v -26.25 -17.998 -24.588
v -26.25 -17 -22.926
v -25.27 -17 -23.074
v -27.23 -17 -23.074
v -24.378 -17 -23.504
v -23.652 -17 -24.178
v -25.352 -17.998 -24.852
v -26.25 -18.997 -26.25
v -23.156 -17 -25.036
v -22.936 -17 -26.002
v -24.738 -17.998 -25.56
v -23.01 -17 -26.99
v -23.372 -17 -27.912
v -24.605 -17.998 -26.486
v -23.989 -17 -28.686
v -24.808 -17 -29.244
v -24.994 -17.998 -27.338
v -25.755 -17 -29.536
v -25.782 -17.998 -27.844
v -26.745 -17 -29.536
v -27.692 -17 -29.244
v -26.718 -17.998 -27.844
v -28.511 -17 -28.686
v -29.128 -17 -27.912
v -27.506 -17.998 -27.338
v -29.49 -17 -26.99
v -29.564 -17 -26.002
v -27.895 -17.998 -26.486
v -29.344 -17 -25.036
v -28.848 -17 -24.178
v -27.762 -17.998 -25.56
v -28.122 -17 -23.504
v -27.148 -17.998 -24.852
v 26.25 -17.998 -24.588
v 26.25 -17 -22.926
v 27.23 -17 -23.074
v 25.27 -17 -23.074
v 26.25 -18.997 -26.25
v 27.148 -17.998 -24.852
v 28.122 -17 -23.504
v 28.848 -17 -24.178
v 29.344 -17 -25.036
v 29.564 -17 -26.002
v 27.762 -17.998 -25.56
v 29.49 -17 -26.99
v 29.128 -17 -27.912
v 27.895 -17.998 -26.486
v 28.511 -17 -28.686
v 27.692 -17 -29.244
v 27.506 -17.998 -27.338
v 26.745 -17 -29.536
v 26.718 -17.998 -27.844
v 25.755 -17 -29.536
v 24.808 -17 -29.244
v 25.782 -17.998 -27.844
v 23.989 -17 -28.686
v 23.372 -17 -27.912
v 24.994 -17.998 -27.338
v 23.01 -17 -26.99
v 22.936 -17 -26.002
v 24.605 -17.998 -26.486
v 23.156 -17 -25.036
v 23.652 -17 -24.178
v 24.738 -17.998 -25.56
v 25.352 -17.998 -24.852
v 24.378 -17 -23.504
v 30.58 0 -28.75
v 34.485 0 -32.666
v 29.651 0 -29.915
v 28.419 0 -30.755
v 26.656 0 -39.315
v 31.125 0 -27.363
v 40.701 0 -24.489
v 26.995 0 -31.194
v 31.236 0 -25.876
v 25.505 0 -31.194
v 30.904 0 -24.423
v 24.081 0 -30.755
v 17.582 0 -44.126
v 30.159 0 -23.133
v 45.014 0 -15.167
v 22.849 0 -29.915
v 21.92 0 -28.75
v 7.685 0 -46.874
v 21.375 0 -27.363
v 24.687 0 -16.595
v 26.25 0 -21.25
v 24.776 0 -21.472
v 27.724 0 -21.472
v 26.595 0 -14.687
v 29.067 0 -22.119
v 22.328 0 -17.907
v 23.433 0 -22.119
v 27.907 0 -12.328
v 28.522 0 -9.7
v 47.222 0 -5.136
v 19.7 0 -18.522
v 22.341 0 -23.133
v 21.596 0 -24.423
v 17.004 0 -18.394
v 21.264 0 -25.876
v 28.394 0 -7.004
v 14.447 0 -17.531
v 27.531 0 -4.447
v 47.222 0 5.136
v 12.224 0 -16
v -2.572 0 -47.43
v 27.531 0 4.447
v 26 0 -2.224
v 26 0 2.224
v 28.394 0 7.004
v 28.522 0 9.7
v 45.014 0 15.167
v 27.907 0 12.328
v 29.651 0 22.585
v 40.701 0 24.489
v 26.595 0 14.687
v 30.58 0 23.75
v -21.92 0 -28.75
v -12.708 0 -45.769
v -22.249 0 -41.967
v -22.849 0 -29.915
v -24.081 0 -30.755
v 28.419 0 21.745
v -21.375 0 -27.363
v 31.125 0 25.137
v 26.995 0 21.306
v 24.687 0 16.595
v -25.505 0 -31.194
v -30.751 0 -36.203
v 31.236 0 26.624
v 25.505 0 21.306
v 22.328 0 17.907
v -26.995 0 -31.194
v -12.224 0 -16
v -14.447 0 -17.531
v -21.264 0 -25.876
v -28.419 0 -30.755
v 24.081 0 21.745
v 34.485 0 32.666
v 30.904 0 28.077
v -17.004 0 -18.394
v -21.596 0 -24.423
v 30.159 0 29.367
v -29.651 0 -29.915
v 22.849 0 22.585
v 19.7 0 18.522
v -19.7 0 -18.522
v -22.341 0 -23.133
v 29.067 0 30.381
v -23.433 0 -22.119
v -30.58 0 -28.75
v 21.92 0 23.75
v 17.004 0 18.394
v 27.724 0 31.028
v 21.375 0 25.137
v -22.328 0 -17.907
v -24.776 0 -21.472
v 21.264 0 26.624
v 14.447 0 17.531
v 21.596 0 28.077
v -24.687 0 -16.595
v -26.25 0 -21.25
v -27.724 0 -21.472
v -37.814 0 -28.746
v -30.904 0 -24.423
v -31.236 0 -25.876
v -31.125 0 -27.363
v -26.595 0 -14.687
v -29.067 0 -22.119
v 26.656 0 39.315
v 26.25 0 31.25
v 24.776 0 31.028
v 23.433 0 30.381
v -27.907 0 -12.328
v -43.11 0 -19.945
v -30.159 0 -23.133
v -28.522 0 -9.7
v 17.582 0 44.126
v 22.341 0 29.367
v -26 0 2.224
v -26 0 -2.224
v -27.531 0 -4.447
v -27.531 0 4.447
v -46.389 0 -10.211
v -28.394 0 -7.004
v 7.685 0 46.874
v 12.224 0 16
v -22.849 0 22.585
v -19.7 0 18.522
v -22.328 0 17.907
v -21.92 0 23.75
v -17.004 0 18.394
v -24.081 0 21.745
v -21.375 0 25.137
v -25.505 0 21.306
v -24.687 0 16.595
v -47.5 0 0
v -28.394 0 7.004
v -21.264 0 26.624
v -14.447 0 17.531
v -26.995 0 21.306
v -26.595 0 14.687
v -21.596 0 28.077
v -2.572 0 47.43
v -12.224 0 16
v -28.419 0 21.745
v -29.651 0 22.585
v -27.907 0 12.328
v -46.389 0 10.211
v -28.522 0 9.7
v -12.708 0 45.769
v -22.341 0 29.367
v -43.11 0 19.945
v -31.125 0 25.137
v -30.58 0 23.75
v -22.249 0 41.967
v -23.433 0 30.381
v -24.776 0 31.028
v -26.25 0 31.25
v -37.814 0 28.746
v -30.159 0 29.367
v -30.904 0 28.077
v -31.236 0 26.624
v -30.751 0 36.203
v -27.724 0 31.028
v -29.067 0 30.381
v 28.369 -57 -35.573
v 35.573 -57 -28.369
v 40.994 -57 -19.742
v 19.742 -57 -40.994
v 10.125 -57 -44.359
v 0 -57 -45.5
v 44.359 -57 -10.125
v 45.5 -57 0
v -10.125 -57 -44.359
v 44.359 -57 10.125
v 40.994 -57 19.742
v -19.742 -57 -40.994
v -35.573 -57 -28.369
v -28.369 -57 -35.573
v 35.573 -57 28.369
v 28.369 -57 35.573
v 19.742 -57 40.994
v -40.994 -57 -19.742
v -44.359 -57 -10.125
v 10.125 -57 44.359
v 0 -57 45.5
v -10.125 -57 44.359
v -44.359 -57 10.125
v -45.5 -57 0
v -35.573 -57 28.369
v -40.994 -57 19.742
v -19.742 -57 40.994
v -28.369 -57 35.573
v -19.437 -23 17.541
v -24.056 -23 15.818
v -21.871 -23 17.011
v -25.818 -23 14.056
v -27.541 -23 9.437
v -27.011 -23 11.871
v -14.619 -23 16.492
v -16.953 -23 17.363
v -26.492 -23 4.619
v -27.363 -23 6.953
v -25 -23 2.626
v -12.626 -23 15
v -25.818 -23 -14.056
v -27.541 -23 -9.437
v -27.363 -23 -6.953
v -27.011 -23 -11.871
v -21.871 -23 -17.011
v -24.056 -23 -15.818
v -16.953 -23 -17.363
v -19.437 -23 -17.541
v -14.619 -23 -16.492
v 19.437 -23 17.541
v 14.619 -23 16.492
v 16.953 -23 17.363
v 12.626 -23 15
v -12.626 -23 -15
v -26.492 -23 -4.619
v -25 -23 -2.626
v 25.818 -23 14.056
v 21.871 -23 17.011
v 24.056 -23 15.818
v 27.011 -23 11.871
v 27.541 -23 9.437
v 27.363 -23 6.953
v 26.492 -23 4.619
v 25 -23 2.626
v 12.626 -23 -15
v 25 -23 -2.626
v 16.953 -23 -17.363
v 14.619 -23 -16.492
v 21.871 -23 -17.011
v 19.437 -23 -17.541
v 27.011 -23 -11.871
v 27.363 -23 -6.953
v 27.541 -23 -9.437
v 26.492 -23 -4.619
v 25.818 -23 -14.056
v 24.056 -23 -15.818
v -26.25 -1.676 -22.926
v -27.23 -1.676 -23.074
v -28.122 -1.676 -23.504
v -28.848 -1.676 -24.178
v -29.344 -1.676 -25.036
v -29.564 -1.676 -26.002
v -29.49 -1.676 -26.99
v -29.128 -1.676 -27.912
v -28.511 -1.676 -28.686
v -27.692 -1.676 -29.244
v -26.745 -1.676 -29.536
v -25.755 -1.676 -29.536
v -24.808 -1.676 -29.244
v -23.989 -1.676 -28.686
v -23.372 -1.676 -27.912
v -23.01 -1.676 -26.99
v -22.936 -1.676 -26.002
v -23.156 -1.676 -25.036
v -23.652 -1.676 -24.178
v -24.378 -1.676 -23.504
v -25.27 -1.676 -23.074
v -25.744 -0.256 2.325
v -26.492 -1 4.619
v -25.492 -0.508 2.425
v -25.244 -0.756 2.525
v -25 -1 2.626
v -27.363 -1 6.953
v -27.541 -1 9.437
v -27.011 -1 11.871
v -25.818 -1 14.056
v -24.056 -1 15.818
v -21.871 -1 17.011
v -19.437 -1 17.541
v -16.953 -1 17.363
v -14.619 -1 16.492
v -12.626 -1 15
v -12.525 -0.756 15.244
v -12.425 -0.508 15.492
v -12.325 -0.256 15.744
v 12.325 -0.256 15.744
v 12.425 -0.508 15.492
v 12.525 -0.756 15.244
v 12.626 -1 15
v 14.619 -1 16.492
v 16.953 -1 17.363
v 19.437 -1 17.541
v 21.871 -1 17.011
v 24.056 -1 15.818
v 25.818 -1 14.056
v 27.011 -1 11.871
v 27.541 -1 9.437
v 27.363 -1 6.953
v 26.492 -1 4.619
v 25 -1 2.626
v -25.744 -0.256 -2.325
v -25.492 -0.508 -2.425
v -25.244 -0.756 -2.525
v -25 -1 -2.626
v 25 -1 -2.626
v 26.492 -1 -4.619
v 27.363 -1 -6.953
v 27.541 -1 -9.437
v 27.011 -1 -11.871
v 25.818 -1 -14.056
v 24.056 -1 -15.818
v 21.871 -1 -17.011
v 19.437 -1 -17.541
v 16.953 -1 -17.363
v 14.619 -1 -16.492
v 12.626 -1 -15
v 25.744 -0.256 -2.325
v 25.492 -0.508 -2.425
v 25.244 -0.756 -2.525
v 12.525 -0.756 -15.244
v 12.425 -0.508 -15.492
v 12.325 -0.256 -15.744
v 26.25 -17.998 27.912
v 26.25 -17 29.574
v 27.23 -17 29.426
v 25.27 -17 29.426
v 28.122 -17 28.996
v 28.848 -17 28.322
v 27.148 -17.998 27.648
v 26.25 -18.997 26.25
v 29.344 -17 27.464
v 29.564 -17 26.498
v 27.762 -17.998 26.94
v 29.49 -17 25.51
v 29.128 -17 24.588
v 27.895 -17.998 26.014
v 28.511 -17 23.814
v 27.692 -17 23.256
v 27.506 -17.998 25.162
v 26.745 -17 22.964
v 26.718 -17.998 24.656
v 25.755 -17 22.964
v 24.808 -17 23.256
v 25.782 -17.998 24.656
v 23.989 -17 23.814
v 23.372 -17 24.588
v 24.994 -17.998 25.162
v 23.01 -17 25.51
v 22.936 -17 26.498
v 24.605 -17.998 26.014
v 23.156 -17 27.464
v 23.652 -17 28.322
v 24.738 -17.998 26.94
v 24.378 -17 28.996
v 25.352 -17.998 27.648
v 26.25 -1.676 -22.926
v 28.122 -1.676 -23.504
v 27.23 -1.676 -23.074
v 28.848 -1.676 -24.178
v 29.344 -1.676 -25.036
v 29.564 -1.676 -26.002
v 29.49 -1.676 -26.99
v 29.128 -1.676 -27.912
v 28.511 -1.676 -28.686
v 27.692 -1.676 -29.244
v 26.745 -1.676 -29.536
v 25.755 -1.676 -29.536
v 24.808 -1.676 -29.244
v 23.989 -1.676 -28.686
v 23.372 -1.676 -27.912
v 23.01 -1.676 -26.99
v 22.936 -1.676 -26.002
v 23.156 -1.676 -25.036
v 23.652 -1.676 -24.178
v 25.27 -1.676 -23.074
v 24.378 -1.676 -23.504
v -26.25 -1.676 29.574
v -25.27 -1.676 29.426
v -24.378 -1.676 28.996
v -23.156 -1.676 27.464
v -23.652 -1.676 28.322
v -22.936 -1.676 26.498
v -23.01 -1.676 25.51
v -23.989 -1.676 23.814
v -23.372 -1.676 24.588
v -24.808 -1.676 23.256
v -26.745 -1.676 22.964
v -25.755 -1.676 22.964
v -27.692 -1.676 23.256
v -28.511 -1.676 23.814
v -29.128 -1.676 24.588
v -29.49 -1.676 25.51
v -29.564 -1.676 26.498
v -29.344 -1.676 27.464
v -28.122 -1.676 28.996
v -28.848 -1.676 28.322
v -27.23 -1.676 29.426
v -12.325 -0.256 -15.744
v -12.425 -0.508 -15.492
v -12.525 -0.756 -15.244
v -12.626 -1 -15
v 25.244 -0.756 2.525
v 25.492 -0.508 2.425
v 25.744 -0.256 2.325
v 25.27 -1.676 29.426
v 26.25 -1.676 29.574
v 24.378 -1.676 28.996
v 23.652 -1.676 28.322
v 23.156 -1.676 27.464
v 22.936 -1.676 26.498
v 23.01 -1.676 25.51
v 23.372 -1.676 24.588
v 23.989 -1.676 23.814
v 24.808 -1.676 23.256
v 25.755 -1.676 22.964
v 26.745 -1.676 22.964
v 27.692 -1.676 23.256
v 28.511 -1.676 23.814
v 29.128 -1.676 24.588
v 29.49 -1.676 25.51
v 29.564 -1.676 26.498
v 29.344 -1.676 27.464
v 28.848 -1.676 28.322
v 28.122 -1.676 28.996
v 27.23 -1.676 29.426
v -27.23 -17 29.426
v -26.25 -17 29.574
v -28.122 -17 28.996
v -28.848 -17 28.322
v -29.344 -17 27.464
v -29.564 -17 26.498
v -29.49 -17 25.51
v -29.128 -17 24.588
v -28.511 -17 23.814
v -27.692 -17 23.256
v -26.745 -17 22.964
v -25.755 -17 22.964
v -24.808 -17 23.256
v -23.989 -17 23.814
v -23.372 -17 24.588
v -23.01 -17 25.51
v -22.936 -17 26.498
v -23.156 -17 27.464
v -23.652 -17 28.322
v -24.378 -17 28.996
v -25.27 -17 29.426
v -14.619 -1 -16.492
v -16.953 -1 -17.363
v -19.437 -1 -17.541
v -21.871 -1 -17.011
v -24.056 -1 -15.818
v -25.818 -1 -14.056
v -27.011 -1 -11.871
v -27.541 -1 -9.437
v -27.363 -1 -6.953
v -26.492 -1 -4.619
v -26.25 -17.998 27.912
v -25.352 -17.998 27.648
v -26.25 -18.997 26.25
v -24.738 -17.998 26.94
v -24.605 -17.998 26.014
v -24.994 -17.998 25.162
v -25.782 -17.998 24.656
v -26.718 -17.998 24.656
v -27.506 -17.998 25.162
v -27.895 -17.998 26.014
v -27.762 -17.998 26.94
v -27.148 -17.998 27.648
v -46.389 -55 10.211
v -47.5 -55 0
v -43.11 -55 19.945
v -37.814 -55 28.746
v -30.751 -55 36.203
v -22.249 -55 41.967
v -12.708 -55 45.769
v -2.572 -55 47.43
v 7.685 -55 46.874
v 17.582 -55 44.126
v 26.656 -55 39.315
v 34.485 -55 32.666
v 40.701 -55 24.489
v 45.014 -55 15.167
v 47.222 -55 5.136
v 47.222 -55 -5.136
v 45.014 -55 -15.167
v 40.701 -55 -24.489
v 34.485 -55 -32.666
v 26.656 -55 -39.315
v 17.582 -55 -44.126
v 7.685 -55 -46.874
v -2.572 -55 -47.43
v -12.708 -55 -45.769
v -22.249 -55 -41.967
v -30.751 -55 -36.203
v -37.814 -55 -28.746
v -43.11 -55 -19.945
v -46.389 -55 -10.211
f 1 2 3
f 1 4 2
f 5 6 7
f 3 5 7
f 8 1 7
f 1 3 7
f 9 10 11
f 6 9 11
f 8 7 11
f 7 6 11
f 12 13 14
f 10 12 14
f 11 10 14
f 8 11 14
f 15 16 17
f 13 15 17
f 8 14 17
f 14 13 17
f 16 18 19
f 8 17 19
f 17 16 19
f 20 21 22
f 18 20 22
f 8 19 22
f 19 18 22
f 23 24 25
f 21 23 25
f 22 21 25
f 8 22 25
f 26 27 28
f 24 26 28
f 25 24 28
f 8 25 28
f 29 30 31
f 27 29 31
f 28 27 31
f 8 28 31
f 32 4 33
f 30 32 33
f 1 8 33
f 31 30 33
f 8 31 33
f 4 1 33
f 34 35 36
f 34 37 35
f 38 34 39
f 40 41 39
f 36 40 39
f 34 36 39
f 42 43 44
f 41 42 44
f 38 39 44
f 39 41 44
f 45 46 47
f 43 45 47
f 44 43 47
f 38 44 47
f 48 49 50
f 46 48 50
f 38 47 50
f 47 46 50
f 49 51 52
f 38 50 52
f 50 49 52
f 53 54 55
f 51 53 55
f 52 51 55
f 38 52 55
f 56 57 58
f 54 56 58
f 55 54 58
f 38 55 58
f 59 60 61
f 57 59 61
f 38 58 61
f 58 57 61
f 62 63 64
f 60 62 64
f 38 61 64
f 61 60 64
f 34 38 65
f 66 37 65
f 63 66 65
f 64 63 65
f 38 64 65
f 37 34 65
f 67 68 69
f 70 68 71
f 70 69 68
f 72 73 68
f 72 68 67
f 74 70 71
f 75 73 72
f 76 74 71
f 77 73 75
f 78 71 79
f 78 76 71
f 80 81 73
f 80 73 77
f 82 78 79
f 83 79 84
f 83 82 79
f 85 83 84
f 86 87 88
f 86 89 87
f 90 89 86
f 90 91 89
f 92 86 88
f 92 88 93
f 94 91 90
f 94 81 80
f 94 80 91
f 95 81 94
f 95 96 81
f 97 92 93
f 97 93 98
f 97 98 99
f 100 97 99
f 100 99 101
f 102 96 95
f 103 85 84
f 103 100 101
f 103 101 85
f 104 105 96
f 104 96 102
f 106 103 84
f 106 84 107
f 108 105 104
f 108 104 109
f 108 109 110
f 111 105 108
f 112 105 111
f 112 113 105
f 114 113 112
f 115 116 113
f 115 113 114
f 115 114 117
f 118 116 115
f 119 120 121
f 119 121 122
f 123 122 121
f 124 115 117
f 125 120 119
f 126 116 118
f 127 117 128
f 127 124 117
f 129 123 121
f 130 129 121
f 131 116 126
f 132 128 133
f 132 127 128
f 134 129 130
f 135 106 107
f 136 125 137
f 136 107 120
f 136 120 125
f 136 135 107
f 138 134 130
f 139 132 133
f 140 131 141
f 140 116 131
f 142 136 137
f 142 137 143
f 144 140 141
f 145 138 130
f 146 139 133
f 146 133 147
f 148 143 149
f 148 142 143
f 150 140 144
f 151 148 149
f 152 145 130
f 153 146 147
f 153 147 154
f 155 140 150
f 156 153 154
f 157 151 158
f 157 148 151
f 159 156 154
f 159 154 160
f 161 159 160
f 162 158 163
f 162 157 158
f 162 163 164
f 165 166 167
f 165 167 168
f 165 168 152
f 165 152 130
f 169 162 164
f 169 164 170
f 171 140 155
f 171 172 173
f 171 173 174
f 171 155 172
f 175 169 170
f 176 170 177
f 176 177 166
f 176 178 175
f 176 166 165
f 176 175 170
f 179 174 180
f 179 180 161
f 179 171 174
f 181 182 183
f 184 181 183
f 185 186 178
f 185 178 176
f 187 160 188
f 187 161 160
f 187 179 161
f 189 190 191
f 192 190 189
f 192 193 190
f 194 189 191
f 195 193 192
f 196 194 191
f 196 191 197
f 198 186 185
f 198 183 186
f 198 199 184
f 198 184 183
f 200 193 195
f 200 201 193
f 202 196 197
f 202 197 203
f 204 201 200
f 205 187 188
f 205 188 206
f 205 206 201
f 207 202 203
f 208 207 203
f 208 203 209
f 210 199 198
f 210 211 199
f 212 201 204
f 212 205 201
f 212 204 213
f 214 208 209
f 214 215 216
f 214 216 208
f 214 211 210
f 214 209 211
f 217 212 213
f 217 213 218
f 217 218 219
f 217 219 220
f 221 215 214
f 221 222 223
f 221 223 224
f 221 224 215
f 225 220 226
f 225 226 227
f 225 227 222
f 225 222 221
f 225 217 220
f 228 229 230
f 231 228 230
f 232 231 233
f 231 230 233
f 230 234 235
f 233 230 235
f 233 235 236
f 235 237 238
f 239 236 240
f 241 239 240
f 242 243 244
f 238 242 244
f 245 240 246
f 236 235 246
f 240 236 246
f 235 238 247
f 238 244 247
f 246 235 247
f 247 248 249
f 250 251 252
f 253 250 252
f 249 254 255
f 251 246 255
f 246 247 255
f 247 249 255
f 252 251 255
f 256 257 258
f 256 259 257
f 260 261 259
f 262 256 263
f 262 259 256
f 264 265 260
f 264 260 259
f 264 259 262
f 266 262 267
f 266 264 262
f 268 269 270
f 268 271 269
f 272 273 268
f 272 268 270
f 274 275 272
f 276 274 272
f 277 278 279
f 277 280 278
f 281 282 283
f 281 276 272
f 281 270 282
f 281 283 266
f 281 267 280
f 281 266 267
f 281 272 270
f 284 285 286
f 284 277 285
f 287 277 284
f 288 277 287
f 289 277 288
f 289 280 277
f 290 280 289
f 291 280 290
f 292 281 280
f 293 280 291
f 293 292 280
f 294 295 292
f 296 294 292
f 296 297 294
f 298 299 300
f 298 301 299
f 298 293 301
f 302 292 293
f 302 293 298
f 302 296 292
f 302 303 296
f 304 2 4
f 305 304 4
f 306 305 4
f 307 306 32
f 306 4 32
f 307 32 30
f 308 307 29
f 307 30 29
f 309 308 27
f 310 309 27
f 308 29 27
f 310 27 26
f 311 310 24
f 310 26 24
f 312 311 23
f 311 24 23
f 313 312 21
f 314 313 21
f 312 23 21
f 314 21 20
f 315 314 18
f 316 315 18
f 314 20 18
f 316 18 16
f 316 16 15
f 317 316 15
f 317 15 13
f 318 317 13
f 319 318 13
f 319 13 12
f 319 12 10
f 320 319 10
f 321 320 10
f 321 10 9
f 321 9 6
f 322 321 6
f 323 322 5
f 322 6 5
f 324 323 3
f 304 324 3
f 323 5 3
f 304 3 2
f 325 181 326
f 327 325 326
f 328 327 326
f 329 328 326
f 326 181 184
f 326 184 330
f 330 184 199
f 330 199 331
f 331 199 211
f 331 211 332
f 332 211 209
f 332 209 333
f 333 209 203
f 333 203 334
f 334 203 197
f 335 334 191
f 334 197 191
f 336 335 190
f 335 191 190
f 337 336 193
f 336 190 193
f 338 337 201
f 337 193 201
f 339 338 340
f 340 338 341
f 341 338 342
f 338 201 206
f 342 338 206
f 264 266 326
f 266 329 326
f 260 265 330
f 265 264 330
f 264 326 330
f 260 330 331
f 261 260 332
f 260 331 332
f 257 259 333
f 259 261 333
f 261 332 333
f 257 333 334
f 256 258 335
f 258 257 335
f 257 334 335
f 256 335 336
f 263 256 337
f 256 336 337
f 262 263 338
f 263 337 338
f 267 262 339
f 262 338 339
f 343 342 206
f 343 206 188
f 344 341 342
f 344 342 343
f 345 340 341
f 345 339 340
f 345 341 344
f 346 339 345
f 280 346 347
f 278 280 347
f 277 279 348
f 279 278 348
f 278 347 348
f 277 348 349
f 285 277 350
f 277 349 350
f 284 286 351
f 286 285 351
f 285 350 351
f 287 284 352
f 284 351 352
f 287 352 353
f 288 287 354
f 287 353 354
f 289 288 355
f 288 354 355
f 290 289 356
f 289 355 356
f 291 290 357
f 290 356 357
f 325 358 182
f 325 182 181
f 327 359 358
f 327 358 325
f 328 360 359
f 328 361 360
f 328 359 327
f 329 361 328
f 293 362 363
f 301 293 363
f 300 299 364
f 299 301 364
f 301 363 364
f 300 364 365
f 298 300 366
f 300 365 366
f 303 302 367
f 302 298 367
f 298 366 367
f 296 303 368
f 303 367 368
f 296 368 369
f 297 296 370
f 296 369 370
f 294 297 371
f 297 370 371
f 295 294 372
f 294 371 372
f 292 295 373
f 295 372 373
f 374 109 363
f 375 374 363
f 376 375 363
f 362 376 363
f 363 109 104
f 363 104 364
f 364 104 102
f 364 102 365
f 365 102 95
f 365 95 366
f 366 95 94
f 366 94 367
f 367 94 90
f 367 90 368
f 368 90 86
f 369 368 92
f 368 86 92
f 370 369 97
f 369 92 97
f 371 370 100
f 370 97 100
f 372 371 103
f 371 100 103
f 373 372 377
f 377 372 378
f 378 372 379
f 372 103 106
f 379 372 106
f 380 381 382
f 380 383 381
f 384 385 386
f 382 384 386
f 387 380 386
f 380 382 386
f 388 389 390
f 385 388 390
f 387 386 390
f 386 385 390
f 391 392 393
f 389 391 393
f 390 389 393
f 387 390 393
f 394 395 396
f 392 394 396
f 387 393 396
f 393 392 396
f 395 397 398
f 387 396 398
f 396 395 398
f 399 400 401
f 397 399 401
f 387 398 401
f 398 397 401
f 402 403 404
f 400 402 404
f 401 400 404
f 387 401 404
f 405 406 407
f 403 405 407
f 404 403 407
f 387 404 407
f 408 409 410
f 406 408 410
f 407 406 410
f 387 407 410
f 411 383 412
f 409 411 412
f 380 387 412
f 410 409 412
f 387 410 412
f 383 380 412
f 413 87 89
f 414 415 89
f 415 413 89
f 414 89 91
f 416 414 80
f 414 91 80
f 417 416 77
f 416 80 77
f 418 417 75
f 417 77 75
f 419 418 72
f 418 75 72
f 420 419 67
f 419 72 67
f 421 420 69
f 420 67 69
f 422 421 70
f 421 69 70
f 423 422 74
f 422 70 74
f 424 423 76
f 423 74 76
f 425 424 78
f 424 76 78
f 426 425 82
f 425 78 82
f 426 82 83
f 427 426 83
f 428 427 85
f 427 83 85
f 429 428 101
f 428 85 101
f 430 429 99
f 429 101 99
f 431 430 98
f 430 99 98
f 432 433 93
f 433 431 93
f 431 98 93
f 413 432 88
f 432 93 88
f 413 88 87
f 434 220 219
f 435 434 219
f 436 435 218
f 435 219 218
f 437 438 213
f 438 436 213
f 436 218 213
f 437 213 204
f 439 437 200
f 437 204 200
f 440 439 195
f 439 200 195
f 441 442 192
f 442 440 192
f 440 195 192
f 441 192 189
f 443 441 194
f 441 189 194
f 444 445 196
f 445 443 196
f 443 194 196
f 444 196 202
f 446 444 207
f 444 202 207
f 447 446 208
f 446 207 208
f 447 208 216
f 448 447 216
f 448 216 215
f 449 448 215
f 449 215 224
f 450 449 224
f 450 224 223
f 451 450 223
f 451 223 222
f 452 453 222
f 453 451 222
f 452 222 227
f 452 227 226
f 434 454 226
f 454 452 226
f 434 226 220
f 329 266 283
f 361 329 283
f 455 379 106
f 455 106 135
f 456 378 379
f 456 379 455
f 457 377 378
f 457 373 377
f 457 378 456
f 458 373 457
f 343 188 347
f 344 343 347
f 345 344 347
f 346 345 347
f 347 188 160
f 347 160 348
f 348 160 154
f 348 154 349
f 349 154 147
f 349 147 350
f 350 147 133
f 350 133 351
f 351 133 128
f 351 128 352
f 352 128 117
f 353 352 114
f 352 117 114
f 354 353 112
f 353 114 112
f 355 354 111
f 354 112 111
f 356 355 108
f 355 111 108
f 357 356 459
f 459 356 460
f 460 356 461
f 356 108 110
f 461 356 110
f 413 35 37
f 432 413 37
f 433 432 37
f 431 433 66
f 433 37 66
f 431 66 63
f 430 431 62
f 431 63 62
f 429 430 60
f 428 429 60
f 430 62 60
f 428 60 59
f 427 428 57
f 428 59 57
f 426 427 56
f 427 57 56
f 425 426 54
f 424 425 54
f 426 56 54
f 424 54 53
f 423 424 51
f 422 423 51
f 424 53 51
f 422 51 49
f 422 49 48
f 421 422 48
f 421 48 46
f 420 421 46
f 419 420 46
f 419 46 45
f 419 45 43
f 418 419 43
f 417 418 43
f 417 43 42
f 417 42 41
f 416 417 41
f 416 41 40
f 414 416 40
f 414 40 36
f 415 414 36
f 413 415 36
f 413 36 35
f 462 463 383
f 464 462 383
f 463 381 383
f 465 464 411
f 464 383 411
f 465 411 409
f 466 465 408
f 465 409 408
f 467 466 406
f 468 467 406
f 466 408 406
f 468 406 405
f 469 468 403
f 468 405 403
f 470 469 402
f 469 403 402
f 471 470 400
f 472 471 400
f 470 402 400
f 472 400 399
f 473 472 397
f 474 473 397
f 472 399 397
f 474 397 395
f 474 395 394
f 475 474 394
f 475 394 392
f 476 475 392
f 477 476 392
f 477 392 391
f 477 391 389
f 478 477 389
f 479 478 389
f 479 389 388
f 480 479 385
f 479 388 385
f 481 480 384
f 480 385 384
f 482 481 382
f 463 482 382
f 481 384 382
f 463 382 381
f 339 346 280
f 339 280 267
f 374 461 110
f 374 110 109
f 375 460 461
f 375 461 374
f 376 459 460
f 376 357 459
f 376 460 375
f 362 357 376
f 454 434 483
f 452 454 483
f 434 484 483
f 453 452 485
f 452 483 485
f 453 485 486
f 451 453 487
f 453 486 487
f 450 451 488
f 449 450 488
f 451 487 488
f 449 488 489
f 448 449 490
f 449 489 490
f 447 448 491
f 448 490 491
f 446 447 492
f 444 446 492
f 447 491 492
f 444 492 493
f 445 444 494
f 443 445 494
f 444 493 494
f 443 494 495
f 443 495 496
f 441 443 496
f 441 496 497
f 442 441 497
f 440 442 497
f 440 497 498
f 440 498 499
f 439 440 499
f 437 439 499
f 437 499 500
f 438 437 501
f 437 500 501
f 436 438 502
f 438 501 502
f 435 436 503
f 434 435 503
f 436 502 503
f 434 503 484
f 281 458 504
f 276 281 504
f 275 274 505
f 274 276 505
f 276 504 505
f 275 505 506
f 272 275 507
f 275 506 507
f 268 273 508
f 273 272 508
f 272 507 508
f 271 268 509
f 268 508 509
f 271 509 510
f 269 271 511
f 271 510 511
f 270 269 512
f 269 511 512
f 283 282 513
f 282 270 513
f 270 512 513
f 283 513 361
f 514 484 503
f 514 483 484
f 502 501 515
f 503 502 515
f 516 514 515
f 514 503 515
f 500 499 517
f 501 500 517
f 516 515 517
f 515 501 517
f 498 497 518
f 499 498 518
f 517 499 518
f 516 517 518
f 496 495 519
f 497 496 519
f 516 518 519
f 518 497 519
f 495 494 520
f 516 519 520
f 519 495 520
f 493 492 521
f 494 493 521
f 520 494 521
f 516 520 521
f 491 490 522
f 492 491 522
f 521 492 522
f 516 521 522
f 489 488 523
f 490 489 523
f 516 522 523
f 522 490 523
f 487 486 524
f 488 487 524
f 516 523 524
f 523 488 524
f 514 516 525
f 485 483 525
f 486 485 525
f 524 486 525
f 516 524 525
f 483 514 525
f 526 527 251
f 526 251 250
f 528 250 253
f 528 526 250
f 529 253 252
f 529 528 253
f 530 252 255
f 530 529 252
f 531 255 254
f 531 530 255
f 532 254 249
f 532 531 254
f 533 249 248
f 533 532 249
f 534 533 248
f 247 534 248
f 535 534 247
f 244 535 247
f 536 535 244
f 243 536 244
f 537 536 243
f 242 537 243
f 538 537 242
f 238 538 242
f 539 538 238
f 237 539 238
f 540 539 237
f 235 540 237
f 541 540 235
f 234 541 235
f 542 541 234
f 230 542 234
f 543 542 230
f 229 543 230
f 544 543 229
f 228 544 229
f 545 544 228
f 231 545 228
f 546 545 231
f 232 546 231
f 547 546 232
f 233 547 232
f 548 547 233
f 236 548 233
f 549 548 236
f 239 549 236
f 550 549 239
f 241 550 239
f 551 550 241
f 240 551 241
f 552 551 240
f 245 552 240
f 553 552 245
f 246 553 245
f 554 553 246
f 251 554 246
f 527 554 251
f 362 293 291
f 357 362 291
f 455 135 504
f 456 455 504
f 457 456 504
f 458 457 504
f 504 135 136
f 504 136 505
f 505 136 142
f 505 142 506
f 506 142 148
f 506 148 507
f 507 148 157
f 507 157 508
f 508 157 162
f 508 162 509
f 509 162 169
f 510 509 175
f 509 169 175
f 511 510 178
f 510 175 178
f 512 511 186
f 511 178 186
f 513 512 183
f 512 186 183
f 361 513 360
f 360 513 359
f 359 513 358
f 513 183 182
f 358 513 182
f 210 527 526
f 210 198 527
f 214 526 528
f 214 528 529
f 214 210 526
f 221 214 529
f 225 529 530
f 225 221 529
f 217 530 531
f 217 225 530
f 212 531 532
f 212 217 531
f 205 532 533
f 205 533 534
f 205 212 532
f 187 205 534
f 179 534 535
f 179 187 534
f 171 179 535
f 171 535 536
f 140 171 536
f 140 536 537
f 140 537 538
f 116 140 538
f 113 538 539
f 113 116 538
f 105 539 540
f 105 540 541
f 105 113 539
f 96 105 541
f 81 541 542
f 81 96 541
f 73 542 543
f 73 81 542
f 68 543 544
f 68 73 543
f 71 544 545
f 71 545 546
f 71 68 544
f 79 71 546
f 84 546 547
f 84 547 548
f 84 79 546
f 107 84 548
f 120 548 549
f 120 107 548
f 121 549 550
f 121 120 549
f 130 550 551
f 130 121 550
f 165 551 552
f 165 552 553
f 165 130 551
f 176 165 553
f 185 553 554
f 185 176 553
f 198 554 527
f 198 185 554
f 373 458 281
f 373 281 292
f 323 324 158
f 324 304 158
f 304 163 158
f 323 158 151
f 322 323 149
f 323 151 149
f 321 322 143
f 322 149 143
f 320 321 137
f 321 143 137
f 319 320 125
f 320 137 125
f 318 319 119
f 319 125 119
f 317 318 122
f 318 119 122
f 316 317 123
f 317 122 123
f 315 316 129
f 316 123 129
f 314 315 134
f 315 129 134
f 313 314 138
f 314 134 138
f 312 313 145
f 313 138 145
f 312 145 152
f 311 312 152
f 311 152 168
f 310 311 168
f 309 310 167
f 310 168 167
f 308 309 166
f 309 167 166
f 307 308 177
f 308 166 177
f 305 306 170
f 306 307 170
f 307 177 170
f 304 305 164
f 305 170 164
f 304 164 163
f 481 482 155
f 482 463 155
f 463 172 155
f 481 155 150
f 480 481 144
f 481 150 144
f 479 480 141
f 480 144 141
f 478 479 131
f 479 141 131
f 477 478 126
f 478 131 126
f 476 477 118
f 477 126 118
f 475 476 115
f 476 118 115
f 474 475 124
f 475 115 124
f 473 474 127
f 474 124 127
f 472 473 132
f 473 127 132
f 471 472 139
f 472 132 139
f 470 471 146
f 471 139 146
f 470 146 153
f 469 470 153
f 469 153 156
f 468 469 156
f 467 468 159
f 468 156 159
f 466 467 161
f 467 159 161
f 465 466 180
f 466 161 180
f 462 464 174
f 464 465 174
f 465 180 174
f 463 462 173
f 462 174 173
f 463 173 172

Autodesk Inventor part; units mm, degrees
ref_plane "YZ Plane" through (0, 0, 0) normal (1, 0, 0) x (0, 1, 0)
ref_plane "XZ Plane" through (0, 0, 0) normal (0, 1, 0) x (-1, 0, 0)
ref_plane "XY Plane" through (0, 0, 0) normal (0, 0, 1) x (1, 0, 0)
sketch "Sketch1" plane through (0, 0, 0) normal (0, 1, 0) x (-1, 0, 0)
  circle A0 centre (0, 0) radius 47.5
  line L0 (-25, 15) -> (25, 15)
  line L1 (25, 15) -> (25, -15)
  line L2 (25, -15) -> (-25, -15)
  line L3 (-25, -15) -> (-25, 15)
  line L4 (-25, 15) -> (25, -15) construction
  line L5 (25, 15) -> (-25, -15) construction
  line L6 (-26.25, 26.25) -> (26.25, 26.25) construction
  line L7 (26.25, 26.25) -> (26.25, -26.25) construction
  line L8 (26.25, -26.25) -> (-26.25, -26.25) construction
  line L9 (-26.25, -26.25) -> (-26.25, 26.25) construction
  line L10 (-26.25, 26.25) -> (26.25, -26.25) construction
  line L11 (26.25, 26.25) -> (-26.25, -26.25) construction
  dimension "d0" = 30
  dimension "d2" = 95
  dimension "holeL" = 52.5
  dimension "d27" = 50
extrude "Extrusion1" add sketch "Sketch1" against normal blind 57 contours A0 | L0 L1 L2 L3
extrude "Extrusion2" cut sketch "Sketch1" against normal blind 23 contours L0 L1 L2 L3
sketch "Sketch3" plane through (0, 0, 0) normal (0, 1, 0) x (1, 0, 0)
  line L0 (-25, -15) -> (-25, 15) construction
  line L1 (-25, 15) -> (25, 15) construction
  line L2 (25, 15) -> (25, -15) construction
  line L3 (25, -15) -> (-25, -15) construction
  circle A0 centre (0, 0) radius 47.5 construction
  circle A1 centre (18.8128, 8.8128) radius 8.75
  line L4 (18.8128, 8.8128) -> (25, 15) construction
  line L5 (-66.5, 0) -> (66.5, 0) construction
  line L6 (0, 66.5) -> (0, -66.5) construction
  circle A2 centre (18.8128, -8.8128) radius 8.75
  circle A3 centre (-18.8128, 8.8128) radius 8.75
  circle A4 centre (-18.8128, -8.8128) radius 8.75
  dimension "d34" = 17.5
  dimension "d33" = 45
extrude "Extrusion3" cut sketch "Sketch3" against normal up to surface (23 mm away)
hole "Hole1" at (-26.25, 0, -26.25) at (26.25, 0, -26.25) at (26.25, 0, 26.25) at (-26.25, 0, 26.25) direction (0, -1, 0) diameter 6.647 depth 17 tip angle 118 countersink diameter 10 countersink angle 90 thread size "M8x1.25" class "6H" standard "ISO Metric profile"
chamfer "Chamfer1" distance 1 angle 45 8 edges at (0, 0, -15) (25, 0, 0) (0, 0, 15) (-25, 0, 0) (-25, 0, -15) (-25, 0, 15) (25, 0, -15) (25, 0, 15)
chamfer "Chamfer2" distance 2 angle 45 1 edges at (47.5, -57, 0)
sketch "Sketch2" plane through (0, -57, 0) normal (0, -1, 0) x (1, 0, 0)
  circle A0 centre (0, 0) radius 15 construction
  circle A1 centre (0, 0) radius 19 construction
  dimension "d23" = 4
  dimension "d24" = 30
mark "Mark1"
properties part number "HM1_FIXT1-001"
